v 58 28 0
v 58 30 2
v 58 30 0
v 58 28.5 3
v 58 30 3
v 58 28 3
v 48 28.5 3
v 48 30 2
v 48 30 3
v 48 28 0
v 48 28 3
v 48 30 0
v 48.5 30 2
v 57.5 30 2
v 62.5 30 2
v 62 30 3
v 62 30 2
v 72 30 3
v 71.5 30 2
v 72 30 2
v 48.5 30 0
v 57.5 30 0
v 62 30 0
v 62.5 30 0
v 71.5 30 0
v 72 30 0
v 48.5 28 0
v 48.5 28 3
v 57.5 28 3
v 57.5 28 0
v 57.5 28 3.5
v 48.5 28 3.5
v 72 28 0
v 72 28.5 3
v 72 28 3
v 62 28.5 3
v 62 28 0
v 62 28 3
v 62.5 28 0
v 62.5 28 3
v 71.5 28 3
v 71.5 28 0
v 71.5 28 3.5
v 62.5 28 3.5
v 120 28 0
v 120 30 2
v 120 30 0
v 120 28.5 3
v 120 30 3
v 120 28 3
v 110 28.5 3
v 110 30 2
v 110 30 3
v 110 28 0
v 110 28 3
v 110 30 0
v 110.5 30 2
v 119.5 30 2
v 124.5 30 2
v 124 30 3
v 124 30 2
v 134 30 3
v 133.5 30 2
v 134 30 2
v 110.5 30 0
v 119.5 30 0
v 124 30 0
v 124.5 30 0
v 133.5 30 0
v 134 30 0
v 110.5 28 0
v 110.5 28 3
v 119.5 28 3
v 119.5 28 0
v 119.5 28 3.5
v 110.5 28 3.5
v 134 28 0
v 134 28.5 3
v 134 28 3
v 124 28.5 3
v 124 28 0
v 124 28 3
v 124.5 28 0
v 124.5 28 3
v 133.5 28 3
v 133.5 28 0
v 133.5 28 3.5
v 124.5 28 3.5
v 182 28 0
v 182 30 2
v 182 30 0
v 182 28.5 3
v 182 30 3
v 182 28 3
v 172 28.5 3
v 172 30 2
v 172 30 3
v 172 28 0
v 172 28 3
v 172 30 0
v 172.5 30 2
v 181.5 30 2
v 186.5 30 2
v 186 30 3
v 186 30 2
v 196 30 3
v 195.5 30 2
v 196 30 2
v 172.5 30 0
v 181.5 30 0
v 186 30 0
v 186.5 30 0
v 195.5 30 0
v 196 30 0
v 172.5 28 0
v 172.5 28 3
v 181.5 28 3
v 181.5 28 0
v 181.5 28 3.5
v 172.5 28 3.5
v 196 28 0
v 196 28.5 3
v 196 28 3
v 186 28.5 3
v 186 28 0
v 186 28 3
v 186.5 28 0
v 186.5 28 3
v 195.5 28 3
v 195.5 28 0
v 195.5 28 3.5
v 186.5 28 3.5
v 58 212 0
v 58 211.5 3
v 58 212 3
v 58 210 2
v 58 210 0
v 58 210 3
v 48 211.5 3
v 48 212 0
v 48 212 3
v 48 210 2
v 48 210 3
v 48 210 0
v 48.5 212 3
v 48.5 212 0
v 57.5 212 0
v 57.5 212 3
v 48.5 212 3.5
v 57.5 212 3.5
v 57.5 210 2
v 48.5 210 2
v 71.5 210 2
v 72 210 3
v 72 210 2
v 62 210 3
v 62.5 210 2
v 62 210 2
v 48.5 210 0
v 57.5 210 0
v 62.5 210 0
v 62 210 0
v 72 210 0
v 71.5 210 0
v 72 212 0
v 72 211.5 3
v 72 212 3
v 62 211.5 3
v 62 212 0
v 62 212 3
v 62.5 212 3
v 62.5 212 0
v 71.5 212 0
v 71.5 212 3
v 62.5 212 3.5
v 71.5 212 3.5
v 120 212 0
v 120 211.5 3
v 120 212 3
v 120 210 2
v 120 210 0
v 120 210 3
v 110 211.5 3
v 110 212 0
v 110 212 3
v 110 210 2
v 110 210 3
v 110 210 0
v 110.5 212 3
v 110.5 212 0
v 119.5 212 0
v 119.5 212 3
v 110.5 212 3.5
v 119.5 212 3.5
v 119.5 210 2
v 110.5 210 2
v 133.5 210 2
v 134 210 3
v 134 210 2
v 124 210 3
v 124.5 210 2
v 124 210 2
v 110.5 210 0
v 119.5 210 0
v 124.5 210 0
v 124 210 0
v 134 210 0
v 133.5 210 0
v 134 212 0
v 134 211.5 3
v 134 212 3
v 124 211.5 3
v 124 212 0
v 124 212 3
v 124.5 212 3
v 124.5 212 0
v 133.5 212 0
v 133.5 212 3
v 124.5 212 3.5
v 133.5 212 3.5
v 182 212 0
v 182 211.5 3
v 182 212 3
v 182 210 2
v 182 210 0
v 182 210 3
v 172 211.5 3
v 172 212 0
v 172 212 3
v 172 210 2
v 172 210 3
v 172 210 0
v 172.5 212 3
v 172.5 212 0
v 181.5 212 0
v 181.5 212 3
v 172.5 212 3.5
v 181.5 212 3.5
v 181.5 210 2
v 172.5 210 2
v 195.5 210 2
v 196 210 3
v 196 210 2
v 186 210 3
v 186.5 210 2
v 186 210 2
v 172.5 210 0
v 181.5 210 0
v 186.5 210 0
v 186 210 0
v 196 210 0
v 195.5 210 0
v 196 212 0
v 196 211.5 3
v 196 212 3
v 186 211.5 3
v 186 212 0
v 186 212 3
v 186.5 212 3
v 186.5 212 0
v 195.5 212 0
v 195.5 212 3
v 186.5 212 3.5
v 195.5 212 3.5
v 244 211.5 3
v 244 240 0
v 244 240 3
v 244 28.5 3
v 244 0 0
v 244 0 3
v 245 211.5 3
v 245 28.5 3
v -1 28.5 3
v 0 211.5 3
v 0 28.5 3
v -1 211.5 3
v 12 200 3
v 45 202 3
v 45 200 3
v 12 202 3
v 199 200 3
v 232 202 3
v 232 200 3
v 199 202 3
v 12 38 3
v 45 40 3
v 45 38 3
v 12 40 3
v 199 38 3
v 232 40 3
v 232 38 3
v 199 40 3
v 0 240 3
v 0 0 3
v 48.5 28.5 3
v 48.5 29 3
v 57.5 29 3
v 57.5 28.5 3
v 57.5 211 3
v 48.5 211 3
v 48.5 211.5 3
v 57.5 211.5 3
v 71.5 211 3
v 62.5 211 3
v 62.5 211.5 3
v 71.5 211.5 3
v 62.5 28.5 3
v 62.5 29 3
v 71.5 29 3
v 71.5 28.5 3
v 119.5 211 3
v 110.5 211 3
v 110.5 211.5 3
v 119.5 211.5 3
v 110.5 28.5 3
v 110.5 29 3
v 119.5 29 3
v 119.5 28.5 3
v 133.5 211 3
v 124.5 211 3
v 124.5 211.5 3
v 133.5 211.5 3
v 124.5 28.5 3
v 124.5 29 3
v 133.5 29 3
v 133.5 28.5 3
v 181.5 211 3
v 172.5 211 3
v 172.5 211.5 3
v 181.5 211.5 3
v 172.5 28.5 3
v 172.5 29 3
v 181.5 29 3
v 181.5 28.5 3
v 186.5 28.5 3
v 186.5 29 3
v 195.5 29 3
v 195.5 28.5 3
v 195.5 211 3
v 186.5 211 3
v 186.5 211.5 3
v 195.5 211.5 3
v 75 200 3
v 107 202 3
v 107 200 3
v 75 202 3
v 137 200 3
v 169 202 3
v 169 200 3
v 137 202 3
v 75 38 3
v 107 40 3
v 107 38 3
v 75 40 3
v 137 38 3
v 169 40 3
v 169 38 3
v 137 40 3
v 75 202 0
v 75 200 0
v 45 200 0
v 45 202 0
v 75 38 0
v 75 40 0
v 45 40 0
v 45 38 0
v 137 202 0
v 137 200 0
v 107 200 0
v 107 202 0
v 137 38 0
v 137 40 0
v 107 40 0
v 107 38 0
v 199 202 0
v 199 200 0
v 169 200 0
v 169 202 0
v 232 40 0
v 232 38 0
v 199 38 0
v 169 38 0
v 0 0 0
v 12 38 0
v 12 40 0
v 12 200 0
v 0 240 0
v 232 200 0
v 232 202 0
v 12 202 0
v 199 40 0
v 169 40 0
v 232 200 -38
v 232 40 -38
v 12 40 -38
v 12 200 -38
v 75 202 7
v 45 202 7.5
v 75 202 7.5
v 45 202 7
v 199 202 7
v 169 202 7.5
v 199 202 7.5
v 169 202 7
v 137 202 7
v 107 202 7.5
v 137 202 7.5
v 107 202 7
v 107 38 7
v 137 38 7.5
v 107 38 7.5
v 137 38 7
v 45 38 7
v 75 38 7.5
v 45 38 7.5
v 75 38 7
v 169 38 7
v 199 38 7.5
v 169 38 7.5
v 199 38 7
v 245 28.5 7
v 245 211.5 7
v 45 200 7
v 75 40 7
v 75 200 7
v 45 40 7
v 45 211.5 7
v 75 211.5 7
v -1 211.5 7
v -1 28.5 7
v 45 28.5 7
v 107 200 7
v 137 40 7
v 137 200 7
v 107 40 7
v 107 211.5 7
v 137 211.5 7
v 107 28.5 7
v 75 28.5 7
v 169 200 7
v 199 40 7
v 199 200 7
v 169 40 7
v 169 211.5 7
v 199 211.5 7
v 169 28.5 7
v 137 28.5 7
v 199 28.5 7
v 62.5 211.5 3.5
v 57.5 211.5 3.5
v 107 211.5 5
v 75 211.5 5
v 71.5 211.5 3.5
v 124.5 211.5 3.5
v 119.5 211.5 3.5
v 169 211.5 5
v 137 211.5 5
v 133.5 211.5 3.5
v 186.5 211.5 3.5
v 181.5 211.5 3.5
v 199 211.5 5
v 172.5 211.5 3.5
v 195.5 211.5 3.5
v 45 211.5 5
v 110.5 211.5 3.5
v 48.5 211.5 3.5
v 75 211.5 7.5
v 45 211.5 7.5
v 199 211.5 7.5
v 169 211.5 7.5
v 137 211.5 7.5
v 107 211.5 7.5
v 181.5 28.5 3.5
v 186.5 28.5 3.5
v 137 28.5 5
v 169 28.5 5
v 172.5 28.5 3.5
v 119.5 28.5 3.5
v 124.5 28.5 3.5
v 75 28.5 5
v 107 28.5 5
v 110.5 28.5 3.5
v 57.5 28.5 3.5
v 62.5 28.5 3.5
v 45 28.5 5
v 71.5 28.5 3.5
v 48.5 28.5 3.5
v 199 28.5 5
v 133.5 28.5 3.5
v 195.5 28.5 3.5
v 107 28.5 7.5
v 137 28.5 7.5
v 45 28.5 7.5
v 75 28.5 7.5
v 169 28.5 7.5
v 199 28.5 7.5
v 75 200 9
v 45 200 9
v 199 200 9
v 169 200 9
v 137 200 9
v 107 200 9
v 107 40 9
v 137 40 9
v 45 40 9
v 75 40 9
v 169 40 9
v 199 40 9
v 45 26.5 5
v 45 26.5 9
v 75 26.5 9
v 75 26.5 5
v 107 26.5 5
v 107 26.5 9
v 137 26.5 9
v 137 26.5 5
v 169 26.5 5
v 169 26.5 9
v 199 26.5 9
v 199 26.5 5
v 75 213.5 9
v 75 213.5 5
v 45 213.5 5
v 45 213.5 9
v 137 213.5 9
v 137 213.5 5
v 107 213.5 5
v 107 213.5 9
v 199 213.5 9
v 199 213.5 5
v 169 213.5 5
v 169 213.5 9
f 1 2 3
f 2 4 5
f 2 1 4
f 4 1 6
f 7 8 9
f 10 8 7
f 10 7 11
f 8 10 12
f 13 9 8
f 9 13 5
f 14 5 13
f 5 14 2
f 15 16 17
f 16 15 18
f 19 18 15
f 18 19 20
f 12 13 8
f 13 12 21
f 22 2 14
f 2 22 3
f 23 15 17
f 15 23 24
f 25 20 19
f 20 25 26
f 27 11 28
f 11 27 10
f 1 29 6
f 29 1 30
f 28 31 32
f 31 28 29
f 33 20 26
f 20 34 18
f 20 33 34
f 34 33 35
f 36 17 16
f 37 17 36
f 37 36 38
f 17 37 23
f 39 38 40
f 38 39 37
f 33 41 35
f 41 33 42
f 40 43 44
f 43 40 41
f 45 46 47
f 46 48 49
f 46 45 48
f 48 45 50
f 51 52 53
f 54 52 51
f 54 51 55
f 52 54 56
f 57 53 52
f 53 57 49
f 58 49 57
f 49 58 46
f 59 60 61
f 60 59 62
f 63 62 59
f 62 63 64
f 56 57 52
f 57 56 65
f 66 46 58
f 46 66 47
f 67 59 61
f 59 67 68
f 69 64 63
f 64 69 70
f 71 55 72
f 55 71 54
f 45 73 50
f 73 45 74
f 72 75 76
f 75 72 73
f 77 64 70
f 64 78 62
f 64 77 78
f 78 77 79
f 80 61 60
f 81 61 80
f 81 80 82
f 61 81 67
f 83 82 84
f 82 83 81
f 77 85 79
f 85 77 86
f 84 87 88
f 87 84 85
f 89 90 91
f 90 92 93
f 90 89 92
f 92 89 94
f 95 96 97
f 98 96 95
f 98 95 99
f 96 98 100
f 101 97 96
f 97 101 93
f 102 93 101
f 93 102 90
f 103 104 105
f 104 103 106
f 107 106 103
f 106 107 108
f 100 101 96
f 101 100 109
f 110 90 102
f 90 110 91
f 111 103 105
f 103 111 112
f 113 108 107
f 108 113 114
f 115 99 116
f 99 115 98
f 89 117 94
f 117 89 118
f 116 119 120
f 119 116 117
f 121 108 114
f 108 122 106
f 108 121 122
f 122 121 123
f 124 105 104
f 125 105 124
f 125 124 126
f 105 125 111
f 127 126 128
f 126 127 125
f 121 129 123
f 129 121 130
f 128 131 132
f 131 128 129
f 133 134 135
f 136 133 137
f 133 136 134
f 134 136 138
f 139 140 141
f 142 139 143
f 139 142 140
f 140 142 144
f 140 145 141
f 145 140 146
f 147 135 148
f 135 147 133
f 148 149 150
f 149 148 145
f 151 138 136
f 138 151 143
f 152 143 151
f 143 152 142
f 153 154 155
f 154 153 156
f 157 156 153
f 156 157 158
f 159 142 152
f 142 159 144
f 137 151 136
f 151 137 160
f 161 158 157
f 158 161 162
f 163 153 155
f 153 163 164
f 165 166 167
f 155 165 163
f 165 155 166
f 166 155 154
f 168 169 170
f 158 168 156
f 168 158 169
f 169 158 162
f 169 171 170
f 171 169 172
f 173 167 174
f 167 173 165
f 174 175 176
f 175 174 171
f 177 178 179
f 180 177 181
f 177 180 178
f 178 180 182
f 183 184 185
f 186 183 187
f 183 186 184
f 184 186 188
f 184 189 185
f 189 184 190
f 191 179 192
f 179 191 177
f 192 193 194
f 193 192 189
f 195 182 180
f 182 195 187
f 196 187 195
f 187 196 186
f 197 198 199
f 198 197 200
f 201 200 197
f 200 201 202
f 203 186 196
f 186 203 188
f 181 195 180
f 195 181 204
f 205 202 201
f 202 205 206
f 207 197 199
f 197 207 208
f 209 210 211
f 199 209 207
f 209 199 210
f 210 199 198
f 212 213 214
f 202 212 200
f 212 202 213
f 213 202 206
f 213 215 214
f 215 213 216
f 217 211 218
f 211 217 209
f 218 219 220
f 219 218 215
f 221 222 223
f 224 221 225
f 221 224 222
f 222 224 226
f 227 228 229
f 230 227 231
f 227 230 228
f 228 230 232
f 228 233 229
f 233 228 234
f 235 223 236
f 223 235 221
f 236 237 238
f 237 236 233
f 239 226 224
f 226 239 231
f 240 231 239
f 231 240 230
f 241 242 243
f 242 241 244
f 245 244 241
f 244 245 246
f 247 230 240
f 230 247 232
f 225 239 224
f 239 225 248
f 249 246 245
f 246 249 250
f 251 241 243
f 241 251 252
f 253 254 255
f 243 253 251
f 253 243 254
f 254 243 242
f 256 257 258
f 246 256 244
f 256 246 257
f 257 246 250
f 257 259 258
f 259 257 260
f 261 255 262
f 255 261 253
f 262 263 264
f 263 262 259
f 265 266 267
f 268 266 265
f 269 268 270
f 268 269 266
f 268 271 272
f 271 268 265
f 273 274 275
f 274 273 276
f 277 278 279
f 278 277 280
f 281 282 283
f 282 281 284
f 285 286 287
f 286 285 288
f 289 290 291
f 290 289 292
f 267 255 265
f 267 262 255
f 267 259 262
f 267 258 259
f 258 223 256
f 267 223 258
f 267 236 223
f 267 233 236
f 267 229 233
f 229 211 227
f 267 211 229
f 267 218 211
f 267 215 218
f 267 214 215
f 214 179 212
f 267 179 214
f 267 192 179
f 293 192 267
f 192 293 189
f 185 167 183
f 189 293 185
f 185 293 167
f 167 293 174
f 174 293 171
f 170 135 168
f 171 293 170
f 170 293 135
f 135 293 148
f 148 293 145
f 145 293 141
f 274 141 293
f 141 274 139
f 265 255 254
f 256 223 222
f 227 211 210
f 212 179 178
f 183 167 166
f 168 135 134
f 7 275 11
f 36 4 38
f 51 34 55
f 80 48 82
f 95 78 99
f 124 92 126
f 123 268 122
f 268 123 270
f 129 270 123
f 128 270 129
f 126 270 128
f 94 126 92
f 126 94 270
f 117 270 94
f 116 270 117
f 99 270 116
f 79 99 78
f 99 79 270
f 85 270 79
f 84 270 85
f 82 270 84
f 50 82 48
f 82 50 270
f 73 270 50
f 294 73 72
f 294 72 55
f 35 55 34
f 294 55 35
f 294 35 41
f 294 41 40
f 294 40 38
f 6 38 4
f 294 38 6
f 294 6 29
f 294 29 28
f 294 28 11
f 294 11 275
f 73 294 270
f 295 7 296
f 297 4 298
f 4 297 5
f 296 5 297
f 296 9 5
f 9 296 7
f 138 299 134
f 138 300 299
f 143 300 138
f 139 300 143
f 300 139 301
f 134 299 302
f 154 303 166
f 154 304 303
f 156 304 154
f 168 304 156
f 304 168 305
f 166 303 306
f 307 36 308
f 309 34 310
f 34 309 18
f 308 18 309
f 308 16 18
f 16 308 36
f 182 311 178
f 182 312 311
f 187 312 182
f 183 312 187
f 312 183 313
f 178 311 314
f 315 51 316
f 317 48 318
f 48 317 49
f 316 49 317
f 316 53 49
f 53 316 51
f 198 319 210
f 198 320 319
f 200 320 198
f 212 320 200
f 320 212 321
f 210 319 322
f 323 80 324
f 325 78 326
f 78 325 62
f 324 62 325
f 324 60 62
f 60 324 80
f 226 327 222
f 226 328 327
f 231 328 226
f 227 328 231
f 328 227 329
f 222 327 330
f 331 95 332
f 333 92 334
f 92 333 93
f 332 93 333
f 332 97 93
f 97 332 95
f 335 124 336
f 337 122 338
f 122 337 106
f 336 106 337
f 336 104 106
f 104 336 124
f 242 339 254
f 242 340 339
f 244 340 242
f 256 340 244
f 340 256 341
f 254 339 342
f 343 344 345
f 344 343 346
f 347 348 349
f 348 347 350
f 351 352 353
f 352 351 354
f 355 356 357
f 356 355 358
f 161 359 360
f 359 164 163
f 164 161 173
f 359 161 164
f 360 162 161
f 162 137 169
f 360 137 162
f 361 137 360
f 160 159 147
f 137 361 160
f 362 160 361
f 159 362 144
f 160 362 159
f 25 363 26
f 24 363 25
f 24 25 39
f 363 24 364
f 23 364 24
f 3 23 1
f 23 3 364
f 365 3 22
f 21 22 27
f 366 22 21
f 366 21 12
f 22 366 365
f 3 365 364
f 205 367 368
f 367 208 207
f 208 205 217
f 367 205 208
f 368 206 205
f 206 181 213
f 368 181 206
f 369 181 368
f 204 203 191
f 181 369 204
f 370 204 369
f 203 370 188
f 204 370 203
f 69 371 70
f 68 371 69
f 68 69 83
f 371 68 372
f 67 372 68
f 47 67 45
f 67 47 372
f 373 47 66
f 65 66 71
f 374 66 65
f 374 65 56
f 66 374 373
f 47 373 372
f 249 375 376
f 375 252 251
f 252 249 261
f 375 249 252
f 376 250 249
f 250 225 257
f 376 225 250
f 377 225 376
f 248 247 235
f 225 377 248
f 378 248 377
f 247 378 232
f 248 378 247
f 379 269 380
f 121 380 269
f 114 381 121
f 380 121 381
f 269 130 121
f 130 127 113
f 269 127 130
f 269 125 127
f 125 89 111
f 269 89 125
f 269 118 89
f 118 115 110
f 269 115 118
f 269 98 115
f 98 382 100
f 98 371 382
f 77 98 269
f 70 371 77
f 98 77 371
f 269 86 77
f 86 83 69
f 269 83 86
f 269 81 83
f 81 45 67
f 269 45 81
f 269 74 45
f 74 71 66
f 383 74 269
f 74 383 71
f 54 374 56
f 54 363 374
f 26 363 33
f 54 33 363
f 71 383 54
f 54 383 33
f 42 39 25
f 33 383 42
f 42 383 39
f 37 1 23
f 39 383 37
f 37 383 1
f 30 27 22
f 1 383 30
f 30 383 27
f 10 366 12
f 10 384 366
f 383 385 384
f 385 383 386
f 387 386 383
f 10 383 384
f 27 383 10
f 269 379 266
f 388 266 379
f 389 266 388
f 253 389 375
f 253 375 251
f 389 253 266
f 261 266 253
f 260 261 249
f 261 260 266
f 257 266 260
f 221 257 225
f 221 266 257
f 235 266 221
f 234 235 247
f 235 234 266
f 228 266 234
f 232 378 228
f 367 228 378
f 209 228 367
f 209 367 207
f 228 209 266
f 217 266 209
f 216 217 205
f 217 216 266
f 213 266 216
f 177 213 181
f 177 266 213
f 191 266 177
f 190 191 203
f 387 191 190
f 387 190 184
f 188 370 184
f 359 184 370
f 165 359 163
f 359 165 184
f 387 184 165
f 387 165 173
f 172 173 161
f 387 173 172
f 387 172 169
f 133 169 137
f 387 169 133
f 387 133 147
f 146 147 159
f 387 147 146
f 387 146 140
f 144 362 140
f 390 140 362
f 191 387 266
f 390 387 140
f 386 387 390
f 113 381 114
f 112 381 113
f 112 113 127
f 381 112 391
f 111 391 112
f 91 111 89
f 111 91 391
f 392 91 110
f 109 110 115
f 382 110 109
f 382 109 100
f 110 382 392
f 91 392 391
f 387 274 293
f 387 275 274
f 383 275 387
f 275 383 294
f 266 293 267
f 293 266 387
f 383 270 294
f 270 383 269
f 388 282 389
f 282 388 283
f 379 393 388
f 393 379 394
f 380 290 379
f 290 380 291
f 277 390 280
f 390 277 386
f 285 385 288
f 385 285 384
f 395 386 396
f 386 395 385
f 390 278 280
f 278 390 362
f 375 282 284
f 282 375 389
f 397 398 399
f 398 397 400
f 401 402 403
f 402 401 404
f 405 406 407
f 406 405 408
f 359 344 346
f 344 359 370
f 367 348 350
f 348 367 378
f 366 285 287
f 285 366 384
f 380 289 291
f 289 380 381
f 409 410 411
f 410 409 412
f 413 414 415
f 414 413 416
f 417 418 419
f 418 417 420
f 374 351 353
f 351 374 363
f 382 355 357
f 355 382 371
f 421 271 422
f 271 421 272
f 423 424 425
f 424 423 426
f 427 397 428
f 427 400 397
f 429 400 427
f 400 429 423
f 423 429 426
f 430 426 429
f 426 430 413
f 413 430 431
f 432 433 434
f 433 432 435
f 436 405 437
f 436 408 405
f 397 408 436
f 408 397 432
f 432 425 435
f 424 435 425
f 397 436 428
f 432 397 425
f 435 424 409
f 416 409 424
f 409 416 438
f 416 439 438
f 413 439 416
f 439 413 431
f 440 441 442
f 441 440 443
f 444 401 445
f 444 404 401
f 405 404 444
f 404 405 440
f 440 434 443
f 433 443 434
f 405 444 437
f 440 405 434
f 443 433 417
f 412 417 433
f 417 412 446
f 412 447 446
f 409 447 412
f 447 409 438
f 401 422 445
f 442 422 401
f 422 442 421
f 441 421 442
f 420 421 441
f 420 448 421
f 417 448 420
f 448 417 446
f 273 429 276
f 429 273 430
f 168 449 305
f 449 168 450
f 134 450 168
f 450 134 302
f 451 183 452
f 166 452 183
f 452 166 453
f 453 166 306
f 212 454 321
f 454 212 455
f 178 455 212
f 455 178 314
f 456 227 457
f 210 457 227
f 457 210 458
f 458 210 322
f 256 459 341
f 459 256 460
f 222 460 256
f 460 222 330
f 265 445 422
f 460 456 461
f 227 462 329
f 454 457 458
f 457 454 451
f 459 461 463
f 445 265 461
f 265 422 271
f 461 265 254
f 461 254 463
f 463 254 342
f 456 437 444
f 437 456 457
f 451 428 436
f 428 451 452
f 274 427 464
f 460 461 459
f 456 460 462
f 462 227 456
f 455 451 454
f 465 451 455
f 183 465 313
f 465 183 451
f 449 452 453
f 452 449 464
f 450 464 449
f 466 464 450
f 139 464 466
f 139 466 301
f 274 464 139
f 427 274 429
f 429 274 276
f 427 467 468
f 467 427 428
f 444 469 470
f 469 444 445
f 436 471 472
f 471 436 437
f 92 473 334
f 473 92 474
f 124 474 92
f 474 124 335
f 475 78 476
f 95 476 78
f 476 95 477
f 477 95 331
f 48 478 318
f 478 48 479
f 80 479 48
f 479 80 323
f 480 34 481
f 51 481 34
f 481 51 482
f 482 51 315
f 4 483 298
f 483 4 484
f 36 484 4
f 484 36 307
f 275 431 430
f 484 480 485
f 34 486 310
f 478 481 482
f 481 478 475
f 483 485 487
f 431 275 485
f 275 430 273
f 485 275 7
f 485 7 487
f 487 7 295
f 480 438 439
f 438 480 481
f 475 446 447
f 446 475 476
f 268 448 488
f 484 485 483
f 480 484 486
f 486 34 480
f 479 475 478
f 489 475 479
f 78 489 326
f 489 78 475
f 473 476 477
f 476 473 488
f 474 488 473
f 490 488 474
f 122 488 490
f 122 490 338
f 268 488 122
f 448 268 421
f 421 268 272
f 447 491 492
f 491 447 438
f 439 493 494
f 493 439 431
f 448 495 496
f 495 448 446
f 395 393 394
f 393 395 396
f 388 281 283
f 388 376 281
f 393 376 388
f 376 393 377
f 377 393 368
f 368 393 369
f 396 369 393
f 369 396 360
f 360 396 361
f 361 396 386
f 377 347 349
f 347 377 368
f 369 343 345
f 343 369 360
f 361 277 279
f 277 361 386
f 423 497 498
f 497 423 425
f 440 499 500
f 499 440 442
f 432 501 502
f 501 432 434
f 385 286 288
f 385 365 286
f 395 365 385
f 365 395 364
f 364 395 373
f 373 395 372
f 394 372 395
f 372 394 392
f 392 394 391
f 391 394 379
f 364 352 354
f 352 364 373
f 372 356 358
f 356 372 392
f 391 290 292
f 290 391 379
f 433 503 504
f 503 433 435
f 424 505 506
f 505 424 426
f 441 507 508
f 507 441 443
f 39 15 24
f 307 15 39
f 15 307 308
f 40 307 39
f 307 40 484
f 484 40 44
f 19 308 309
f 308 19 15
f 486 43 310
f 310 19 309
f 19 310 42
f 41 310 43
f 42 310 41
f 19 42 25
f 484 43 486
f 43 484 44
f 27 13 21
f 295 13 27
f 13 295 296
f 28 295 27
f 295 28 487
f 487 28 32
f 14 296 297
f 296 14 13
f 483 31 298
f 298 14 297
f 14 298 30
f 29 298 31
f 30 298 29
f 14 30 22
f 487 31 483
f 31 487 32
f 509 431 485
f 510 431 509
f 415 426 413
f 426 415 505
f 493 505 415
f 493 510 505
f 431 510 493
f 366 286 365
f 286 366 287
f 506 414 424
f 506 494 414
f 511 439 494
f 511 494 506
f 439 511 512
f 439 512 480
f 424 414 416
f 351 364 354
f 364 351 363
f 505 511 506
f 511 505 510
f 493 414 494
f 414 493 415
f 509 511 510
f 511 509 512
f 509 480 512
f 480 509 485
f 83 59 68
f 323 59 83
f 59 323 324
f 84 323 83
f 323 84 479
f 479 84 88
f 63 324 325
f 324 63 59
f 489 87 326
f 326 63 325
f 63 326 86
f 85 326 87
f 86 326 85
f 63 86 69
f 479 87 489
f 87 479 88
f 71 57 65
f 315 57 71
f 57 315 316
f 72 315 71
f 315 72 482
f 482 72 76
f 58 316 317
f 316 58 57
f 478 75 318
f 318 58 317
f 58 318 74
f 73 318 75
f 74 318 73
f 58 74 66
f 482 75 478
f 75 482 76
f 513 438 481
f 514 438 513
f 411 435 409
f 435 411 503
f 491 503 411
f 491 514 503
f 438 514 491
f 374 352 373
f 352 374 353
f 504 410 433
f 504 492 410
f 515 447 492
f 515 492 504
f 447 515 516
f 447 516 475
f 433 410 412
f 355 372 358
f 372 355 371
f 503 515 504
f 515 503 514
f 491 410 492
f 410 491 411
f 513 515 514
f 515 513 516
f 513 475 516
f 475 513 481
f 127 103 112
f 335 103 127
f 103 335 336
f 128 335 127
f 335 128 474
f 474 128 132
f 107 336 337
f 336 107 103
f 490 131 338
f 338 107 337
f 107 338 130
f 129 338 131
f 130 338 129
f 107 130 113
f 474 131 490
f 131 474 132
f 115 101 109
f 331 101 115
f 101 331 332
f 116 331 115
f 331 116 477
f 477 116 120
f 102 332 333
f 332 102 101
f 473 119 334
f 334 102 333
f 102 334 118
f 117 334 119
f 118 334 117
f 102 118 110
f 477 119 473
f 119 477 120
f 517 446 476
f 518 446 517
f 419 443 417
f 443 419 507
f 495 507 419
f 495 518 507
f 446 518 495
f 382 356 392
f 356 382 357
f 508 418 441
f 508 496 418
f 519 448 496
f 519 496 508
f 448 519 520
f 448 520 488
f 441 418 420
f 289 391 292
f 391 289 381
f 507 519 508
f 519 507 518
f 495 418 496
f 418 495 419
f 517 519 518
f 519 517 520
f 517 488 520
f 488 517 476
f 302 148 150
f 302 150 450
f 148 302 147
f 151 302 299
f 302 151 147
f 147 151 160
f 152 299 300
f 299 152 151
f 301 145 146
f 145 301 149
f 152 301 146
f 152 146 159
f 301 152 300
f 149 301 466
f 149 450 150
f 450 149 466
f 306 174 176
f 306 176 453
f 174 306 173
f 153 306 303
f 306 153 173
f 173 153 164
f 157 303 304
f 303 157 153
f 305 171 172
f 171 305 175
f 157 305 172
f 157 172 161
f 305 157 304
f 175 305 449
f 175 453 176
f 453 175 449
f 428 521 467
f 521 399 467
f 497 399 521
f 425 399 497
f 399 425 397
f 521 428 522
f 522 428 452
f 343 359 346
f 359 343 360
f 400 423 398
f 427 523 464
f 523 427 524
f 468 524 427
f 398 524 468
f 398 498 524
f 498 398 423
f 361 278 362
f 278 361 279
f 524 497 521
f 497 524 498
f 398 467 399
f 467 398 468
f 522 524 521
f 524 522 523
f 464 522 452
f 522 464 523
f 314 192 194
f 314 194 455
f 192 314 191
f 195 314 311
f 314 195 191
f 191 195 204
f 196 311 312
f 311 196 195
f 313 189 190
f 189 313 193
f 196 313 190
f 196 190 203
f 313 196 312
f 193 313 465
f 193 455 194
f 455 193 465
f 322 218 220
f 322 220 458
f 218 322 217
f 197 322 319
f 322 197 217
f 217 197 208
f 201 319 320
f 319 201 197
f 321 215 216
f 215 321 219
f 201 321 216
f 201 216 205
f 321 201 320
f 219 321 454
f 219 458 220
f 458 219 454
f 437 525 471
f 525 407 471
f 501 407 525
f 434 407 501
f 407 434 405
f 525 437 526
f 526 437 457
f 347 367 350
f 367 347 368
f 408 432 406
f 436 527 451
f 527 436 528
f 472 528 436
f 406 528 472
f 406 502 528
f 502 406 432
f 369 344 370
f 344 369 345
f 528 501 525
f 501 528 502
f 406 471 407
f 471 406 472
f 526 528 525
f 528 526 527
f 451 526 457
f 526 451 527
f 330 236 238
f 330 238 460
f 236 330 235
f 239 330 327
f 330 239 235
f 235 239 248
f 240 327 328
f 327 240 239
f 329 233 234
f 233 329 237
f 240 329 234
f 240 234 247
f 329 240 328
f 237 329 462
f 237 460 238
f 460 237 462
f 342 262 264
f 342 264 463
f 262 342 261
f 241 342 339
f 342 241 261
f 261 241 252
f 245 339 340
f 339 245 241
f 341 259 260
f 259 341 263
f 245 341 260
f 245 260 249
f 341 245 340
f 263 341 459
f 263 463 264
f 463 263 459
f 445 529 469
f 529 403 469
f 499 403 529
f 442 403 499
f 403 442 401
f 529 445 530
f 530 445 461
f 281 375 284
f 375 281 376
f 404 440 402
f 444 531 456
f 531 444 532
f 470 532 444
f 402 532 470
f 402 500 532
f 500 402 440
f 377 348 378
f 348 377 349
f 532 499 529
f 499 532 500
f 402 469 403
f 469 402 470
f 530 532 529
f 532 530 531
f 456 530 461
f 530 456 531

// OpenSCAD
// ============================================================
// TESTE — DIVISÓRIA WEGA COMPLETA (MDF + 6 CLIPS + FILTRO)
// Vista completa da divisória com todos os clips posicionados
// Clips com dentes snap-fit que passam por slots no MDF
// NÃO há clips nos lados X (trilhos passam ali)
// Abra no OpenSCAD → F5 (preview)
// ============================================================
// MUDE 'vista':
//   1 = Vista de cima (planta)
//   2 = Vista 3D montada
//   3 = Vista 3D explodida
// ============================================================

vista = 2;  // [1:Planta, 2:3D Montado, 3:3D Explodido]
explode = 25;

// === DIMENSÕES DA DIVISÓRIA ===
mdf_w = 244;
mdf_h = 240;
mdf_t = 3;

// Furo 220×164mm centralizado
// X: (244-220)/2 = 12mm → X de 12 a 232
// Y: (240-164)/2 = 38mm → Y de 38 a 202
// 164mm = corpo 160mm + 2×2mm para paredes dos clips
furo_x1 = 12;     furo_x2 = 232;
furo_y1 = 38;     furo_y2 = 202;
furo_w = furo_x2 - furo_x1;  // 220
furo_h = furo_y2 - furo_y1;  // 164

// Filtro Wega (corpo 220×160×41mm mídia, frame/borda 246×183×4mm PU)
filtro_w = 220;
filtro_h = 160;
filtro_corpo = 45;
wega_borda_esp  = 4;
wega_borda_larg = 9.5;   // extensão frame além do furo em Y ((183-164)/2)
// Frame total: 246×183mm
frame_w = 246;
frame_h = 183;

// Clip Wega (snap-fit com dentes)
clip_larg = 30;
clip_parede = 2;
base_prof = 8;
base_esp = 2;
aba_comp = 11.5;     // wega_borda_larg (9.5) + 2mm garra
aba_esp = 1.5;
batente_alt = 2.5;   // lip desce 2.5mm abaixo da aba
dente_h = 1.5;
dente_w = 9;
dente_pos = 7;
folga_filtro = 0.5;
gap = mdf_t + wega_borda_esp + folga_filtro;

// Slots para dentes (10×2mm, 8mm do furo)
slot_w = 10;
slot_comp = 2;


// Posições dos 6 clips (centros)
// SÓ nos lados Y (superior/inferior) — lados X têm trilhos!
// [x, y, rotação_z]
clips_pos = [
    // Inferior (Y=40): 3 clips
    [60,  furo_y1, 180],
    [122, furo_y1, 180],
    [184, furo_y1, 180],
    // Superior (Y=200): 3 clips
    [60,  furo_y2, 0],
    [122, furo_y2, 0],
    [184, furo_y2, 0]
    // Lados X: SEM clips (margem 12mm usada pelos trilhos)
];

// Posições dos slots (12 total, 2 por clip)
// [x_center, y_center] do slot 10×2mm
slots_inf = [
    [53, 29], [67, 29],     // clip 60
    [115, 29], [129, 29],   // clip 122
    [177, 29], [191, 29]    // clip 184
];
slots_sup = [
    [53, 211], [67, 211],
    [115, 211], [129, 211],
    [177, 211], [191, 211]
];

// === MÓDULOS ===

module dente_snap_3d() {
    hull() {
        cube([dente_w, 0.1, base_esp]);
        translate([0, dente_h, 0])
            cube([dente_w, 0.1, base_esp + dente_h]);
    }
    translate([0, dente_h, 0])
        cube([dente_w, 0.5, base_esp + dente_h]);
}

module clip_wega_3d() {
    // Base (sob o MDF)
    cube([clip_larg, base_prof, base_esp]);
    // Parede (lado furo, Y<0)
    translate([0, -clip_parede, 0])
        cube([clip_larg, clip_parede, gap + aba_esp]);
    // Aba (sobre frame, conecta com parede)
    translate([0, -clip_parede, gap])
        cube([clip_larg, aba_comp + clip_parede, aba_esp]);
    // Batente (lip na borda externa do frame)
    translate([0, wega_borda_larg, gap - batente_alt])
        cube([clip_larg, aba_comp - wega_borda_larg, batente_alt + aba_esp]);
    // Dentes
    translate([clip_larg/2 - dente_pos - dente_w/2, base_prof, 0])
        dente_snap_3d();
    translate([clip_larg/2 + dente_pos - dente_w/2, base_prof, 0])
        dente_snap_3d();
}

module mdf_placa() {
    color("BurlyWood", 0.8)
    difference() {
        cube([mdf_w, mdf_h, mdf_t]);
        // Furo central 220×160mm
        translate([furo_x1, furo_y1, -0.1])
            cube([furo_w, furo_h, mdf_t + 0.2]);
        // Slots para dentes (12 total)
        for (s = concat(slots_inf, slots_sup))
            translate([s[0] - slot_w/2, s[1] - slot_comp/2, -0.1])
                cube([slot_w, slot_comp, mdf_t + 0.2]);
    }
}

module filtro_wega() {
    cx = mdf_w/2;
    cy = mdf_h/2;
    // Frame do filtro (246×183mm, repousa SOBRE o MDF ao redor do furo)
    color("LimeGreen", 0.4)
    translate([cx - frame_w/2, cy - frame_h/2, mdf_t])
        cube([frame_w, frame_h, wega_borda_esp]);
    // Corpo do filtro (abaixo do MDF, passa pelo furo 220×160)
    color("DarkSlateGray", 0.3)
    translate([cx - filtro_w/2, cy - filtro_h/2, mdf_t - (filtro_corpo - wega_borda_esp)])
        cube([filtro_w, filtro_h, filtro_corpo - wega_borda_esp]);
}

module colocar_clips(dz = 0) {
    color("Orange")
    for (cp = clips_pos) {
        translate([cp[0], cp[1], dz])
            rotate([0, 0, cp[2]])
                translate([-clip_larg/2, 0, 0])
                    clip_wega_3d();
    }
}


// === VISTA 1: PLANTA (CIMA) ===
if (vista == 1) {
    echo("=== VISTA PLANTA ===");
    echo("Furo 220x164mm (corpo 160mm + 4mm clips)");
    echo("12 slots 10x2mm para 6 clips");
    echo("Margem X=12mm (trilhos), Y=38mm");
    projection(cut=false)
        translate([0, 0, 0]) {
            mdf_placa();
            color("Orange", 0.5)
            for (cp = clips_pos)
                translate([cp[0], cp[1], 0])
                    rotate([0, 0, cp[2]])
                        translate([-clip_larg/2, -1, 0])
                            cube([clip_larg, base_prof + 2, 0.5]);
        }
}

// === VISTA 2: 3D MONTADO ===
if (vista == 2) {
    echo("=== 3D MONTADO ===");
    echo("Gire para verificar todos os 6 clips");
    mdf_placa();
    filtro_wega();
    colocar_clips();
}

// === VISTA 3: 3D EXPLODIDO ===
if (vista == 3) {
    echo("=== EXPLODIDO ===");
    translate([0, 0, -explode]) mdf_placa();
    filtro_wega();
    colocar_clips(explode);
}
